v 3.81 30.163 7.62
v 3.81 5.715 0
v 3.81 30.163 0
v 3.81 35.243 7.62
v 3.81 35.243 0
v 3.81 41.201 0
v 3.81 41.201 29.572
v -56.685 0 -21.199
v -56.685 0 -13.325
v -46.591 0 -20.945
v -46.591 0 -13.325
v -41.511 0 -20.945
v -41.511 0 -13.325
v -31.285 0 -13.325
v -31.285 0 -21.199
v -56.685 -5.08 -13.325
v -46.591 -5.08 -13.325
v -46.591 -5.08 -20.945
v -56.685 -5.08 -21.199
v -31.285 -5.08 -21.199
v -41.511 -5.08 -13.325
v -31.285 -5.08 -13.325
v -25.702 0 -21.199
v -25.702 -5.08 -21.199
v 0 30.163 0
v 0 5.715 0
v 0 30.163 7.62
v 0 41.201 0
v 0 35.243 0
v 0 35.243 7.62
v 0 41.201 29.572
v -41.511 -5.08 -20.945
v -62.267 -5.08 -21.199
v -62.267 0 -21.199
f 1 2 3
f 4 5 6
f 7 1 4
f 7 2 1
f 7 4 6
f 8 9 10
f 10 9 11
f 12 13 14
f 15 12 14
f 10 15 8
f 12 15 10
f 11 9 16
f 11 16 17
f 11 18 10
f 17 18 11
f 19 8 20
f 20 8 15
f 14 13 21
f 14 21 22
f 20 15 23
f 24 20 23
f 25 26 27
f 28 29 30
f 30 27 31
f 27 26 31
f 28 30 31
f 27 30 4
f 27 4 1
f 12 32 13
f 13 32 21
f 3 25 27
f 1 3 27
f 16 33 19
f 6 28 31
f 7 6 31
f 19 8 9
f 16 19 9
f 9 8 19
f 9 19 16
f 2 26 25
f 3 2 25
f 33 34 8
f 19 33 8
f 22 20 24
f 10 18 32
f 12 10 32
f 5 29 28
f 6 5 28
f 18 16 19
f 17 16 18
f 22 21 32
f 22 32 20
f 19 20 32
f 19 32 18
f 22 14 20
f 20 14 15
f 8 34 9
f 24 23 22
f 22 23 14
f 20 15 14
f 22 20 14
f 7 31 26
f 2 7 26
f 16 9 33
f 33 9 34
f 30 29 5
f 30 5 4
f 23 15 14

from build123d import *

# Parameters (mm, degrees)
F1_DEPTH = 3.81
F2_W     = 5.08
F2_H     = 7.62
F3_DEPTH = 25.4
F6_DEPTH = 5.08
F5_W     = 25.4
F5_H     = 7.874
F7_W     = 5.08
F7_H     = 7.62
F8_DEPTH = 25.4


with BuildPart() as f1:
    # F0 (on Right) → F1 (new body)
    with BuildSketch(Plane.YZ):
        Polygon((41.2011630833, 0), (41.2011630833, 29.5718032867), (5.7149999775, 0), align=None)
    extrude(amount=F1_DEPTH)

    # F2 (on face) → F3 (cut)
    with BuildSketch(Plane(origin=(0, 0, 0), x_dir=(0, -1, 0), z_dir=(-1, 0, 0))):
        with Locations((-32.703421793, 3.81)):
            Rectangle(F2_W, F2_H)
    extrude(amount=-F3_DEPTH, mode=Mode.SUBTRACT)


with BuildPart() as f6:
    # F4 (on Front) → F6 (new body)
    with BuildSketch(Plane.XZ):
        Polygon((-56.6846917487, -21.1986619979), (-56.6846917487, -13.3246619979), (-62.2669160366, -21.1986619979), align=None)
    extrude(amount=F6_DEPTH)


with BuildPart() as f6b:
    # F4 (on Front) → F6, piece 2 (new body)
    with BuildSketch(Plane.XZ):
        Polygon((-25.7024674609, -21.1986619979), (-31.2846917487, -13.3246619979), (-31.2846917487, -21.1986619979), align=None)
    extrude(amount=F6_DEPTH)


with BuildPart() as f6c:
    # F5 (on face) → F6, piece 3 (new body)
    with BuildSketch(Plane.XZ):
        with Locations((-43.9846917487, -17.2616619979)):
            Rectangle(F5_W, F5_H)
    extrude(amount=F6_DEPTH)

    # F7 (on face) → F8 (cut)
    with BuildSketch(Plane.XZ.offset(5.08)):
        with Locations((-44.0506187892, -17.1346619979)):
            Rectangle(F7_W, F7_H)
    extrude(amount=-F8_DEPTH, mode=Mode.SUBTRACT)


solid = Compound([f1.part, f6.part, f6b.part, f6c.part])
